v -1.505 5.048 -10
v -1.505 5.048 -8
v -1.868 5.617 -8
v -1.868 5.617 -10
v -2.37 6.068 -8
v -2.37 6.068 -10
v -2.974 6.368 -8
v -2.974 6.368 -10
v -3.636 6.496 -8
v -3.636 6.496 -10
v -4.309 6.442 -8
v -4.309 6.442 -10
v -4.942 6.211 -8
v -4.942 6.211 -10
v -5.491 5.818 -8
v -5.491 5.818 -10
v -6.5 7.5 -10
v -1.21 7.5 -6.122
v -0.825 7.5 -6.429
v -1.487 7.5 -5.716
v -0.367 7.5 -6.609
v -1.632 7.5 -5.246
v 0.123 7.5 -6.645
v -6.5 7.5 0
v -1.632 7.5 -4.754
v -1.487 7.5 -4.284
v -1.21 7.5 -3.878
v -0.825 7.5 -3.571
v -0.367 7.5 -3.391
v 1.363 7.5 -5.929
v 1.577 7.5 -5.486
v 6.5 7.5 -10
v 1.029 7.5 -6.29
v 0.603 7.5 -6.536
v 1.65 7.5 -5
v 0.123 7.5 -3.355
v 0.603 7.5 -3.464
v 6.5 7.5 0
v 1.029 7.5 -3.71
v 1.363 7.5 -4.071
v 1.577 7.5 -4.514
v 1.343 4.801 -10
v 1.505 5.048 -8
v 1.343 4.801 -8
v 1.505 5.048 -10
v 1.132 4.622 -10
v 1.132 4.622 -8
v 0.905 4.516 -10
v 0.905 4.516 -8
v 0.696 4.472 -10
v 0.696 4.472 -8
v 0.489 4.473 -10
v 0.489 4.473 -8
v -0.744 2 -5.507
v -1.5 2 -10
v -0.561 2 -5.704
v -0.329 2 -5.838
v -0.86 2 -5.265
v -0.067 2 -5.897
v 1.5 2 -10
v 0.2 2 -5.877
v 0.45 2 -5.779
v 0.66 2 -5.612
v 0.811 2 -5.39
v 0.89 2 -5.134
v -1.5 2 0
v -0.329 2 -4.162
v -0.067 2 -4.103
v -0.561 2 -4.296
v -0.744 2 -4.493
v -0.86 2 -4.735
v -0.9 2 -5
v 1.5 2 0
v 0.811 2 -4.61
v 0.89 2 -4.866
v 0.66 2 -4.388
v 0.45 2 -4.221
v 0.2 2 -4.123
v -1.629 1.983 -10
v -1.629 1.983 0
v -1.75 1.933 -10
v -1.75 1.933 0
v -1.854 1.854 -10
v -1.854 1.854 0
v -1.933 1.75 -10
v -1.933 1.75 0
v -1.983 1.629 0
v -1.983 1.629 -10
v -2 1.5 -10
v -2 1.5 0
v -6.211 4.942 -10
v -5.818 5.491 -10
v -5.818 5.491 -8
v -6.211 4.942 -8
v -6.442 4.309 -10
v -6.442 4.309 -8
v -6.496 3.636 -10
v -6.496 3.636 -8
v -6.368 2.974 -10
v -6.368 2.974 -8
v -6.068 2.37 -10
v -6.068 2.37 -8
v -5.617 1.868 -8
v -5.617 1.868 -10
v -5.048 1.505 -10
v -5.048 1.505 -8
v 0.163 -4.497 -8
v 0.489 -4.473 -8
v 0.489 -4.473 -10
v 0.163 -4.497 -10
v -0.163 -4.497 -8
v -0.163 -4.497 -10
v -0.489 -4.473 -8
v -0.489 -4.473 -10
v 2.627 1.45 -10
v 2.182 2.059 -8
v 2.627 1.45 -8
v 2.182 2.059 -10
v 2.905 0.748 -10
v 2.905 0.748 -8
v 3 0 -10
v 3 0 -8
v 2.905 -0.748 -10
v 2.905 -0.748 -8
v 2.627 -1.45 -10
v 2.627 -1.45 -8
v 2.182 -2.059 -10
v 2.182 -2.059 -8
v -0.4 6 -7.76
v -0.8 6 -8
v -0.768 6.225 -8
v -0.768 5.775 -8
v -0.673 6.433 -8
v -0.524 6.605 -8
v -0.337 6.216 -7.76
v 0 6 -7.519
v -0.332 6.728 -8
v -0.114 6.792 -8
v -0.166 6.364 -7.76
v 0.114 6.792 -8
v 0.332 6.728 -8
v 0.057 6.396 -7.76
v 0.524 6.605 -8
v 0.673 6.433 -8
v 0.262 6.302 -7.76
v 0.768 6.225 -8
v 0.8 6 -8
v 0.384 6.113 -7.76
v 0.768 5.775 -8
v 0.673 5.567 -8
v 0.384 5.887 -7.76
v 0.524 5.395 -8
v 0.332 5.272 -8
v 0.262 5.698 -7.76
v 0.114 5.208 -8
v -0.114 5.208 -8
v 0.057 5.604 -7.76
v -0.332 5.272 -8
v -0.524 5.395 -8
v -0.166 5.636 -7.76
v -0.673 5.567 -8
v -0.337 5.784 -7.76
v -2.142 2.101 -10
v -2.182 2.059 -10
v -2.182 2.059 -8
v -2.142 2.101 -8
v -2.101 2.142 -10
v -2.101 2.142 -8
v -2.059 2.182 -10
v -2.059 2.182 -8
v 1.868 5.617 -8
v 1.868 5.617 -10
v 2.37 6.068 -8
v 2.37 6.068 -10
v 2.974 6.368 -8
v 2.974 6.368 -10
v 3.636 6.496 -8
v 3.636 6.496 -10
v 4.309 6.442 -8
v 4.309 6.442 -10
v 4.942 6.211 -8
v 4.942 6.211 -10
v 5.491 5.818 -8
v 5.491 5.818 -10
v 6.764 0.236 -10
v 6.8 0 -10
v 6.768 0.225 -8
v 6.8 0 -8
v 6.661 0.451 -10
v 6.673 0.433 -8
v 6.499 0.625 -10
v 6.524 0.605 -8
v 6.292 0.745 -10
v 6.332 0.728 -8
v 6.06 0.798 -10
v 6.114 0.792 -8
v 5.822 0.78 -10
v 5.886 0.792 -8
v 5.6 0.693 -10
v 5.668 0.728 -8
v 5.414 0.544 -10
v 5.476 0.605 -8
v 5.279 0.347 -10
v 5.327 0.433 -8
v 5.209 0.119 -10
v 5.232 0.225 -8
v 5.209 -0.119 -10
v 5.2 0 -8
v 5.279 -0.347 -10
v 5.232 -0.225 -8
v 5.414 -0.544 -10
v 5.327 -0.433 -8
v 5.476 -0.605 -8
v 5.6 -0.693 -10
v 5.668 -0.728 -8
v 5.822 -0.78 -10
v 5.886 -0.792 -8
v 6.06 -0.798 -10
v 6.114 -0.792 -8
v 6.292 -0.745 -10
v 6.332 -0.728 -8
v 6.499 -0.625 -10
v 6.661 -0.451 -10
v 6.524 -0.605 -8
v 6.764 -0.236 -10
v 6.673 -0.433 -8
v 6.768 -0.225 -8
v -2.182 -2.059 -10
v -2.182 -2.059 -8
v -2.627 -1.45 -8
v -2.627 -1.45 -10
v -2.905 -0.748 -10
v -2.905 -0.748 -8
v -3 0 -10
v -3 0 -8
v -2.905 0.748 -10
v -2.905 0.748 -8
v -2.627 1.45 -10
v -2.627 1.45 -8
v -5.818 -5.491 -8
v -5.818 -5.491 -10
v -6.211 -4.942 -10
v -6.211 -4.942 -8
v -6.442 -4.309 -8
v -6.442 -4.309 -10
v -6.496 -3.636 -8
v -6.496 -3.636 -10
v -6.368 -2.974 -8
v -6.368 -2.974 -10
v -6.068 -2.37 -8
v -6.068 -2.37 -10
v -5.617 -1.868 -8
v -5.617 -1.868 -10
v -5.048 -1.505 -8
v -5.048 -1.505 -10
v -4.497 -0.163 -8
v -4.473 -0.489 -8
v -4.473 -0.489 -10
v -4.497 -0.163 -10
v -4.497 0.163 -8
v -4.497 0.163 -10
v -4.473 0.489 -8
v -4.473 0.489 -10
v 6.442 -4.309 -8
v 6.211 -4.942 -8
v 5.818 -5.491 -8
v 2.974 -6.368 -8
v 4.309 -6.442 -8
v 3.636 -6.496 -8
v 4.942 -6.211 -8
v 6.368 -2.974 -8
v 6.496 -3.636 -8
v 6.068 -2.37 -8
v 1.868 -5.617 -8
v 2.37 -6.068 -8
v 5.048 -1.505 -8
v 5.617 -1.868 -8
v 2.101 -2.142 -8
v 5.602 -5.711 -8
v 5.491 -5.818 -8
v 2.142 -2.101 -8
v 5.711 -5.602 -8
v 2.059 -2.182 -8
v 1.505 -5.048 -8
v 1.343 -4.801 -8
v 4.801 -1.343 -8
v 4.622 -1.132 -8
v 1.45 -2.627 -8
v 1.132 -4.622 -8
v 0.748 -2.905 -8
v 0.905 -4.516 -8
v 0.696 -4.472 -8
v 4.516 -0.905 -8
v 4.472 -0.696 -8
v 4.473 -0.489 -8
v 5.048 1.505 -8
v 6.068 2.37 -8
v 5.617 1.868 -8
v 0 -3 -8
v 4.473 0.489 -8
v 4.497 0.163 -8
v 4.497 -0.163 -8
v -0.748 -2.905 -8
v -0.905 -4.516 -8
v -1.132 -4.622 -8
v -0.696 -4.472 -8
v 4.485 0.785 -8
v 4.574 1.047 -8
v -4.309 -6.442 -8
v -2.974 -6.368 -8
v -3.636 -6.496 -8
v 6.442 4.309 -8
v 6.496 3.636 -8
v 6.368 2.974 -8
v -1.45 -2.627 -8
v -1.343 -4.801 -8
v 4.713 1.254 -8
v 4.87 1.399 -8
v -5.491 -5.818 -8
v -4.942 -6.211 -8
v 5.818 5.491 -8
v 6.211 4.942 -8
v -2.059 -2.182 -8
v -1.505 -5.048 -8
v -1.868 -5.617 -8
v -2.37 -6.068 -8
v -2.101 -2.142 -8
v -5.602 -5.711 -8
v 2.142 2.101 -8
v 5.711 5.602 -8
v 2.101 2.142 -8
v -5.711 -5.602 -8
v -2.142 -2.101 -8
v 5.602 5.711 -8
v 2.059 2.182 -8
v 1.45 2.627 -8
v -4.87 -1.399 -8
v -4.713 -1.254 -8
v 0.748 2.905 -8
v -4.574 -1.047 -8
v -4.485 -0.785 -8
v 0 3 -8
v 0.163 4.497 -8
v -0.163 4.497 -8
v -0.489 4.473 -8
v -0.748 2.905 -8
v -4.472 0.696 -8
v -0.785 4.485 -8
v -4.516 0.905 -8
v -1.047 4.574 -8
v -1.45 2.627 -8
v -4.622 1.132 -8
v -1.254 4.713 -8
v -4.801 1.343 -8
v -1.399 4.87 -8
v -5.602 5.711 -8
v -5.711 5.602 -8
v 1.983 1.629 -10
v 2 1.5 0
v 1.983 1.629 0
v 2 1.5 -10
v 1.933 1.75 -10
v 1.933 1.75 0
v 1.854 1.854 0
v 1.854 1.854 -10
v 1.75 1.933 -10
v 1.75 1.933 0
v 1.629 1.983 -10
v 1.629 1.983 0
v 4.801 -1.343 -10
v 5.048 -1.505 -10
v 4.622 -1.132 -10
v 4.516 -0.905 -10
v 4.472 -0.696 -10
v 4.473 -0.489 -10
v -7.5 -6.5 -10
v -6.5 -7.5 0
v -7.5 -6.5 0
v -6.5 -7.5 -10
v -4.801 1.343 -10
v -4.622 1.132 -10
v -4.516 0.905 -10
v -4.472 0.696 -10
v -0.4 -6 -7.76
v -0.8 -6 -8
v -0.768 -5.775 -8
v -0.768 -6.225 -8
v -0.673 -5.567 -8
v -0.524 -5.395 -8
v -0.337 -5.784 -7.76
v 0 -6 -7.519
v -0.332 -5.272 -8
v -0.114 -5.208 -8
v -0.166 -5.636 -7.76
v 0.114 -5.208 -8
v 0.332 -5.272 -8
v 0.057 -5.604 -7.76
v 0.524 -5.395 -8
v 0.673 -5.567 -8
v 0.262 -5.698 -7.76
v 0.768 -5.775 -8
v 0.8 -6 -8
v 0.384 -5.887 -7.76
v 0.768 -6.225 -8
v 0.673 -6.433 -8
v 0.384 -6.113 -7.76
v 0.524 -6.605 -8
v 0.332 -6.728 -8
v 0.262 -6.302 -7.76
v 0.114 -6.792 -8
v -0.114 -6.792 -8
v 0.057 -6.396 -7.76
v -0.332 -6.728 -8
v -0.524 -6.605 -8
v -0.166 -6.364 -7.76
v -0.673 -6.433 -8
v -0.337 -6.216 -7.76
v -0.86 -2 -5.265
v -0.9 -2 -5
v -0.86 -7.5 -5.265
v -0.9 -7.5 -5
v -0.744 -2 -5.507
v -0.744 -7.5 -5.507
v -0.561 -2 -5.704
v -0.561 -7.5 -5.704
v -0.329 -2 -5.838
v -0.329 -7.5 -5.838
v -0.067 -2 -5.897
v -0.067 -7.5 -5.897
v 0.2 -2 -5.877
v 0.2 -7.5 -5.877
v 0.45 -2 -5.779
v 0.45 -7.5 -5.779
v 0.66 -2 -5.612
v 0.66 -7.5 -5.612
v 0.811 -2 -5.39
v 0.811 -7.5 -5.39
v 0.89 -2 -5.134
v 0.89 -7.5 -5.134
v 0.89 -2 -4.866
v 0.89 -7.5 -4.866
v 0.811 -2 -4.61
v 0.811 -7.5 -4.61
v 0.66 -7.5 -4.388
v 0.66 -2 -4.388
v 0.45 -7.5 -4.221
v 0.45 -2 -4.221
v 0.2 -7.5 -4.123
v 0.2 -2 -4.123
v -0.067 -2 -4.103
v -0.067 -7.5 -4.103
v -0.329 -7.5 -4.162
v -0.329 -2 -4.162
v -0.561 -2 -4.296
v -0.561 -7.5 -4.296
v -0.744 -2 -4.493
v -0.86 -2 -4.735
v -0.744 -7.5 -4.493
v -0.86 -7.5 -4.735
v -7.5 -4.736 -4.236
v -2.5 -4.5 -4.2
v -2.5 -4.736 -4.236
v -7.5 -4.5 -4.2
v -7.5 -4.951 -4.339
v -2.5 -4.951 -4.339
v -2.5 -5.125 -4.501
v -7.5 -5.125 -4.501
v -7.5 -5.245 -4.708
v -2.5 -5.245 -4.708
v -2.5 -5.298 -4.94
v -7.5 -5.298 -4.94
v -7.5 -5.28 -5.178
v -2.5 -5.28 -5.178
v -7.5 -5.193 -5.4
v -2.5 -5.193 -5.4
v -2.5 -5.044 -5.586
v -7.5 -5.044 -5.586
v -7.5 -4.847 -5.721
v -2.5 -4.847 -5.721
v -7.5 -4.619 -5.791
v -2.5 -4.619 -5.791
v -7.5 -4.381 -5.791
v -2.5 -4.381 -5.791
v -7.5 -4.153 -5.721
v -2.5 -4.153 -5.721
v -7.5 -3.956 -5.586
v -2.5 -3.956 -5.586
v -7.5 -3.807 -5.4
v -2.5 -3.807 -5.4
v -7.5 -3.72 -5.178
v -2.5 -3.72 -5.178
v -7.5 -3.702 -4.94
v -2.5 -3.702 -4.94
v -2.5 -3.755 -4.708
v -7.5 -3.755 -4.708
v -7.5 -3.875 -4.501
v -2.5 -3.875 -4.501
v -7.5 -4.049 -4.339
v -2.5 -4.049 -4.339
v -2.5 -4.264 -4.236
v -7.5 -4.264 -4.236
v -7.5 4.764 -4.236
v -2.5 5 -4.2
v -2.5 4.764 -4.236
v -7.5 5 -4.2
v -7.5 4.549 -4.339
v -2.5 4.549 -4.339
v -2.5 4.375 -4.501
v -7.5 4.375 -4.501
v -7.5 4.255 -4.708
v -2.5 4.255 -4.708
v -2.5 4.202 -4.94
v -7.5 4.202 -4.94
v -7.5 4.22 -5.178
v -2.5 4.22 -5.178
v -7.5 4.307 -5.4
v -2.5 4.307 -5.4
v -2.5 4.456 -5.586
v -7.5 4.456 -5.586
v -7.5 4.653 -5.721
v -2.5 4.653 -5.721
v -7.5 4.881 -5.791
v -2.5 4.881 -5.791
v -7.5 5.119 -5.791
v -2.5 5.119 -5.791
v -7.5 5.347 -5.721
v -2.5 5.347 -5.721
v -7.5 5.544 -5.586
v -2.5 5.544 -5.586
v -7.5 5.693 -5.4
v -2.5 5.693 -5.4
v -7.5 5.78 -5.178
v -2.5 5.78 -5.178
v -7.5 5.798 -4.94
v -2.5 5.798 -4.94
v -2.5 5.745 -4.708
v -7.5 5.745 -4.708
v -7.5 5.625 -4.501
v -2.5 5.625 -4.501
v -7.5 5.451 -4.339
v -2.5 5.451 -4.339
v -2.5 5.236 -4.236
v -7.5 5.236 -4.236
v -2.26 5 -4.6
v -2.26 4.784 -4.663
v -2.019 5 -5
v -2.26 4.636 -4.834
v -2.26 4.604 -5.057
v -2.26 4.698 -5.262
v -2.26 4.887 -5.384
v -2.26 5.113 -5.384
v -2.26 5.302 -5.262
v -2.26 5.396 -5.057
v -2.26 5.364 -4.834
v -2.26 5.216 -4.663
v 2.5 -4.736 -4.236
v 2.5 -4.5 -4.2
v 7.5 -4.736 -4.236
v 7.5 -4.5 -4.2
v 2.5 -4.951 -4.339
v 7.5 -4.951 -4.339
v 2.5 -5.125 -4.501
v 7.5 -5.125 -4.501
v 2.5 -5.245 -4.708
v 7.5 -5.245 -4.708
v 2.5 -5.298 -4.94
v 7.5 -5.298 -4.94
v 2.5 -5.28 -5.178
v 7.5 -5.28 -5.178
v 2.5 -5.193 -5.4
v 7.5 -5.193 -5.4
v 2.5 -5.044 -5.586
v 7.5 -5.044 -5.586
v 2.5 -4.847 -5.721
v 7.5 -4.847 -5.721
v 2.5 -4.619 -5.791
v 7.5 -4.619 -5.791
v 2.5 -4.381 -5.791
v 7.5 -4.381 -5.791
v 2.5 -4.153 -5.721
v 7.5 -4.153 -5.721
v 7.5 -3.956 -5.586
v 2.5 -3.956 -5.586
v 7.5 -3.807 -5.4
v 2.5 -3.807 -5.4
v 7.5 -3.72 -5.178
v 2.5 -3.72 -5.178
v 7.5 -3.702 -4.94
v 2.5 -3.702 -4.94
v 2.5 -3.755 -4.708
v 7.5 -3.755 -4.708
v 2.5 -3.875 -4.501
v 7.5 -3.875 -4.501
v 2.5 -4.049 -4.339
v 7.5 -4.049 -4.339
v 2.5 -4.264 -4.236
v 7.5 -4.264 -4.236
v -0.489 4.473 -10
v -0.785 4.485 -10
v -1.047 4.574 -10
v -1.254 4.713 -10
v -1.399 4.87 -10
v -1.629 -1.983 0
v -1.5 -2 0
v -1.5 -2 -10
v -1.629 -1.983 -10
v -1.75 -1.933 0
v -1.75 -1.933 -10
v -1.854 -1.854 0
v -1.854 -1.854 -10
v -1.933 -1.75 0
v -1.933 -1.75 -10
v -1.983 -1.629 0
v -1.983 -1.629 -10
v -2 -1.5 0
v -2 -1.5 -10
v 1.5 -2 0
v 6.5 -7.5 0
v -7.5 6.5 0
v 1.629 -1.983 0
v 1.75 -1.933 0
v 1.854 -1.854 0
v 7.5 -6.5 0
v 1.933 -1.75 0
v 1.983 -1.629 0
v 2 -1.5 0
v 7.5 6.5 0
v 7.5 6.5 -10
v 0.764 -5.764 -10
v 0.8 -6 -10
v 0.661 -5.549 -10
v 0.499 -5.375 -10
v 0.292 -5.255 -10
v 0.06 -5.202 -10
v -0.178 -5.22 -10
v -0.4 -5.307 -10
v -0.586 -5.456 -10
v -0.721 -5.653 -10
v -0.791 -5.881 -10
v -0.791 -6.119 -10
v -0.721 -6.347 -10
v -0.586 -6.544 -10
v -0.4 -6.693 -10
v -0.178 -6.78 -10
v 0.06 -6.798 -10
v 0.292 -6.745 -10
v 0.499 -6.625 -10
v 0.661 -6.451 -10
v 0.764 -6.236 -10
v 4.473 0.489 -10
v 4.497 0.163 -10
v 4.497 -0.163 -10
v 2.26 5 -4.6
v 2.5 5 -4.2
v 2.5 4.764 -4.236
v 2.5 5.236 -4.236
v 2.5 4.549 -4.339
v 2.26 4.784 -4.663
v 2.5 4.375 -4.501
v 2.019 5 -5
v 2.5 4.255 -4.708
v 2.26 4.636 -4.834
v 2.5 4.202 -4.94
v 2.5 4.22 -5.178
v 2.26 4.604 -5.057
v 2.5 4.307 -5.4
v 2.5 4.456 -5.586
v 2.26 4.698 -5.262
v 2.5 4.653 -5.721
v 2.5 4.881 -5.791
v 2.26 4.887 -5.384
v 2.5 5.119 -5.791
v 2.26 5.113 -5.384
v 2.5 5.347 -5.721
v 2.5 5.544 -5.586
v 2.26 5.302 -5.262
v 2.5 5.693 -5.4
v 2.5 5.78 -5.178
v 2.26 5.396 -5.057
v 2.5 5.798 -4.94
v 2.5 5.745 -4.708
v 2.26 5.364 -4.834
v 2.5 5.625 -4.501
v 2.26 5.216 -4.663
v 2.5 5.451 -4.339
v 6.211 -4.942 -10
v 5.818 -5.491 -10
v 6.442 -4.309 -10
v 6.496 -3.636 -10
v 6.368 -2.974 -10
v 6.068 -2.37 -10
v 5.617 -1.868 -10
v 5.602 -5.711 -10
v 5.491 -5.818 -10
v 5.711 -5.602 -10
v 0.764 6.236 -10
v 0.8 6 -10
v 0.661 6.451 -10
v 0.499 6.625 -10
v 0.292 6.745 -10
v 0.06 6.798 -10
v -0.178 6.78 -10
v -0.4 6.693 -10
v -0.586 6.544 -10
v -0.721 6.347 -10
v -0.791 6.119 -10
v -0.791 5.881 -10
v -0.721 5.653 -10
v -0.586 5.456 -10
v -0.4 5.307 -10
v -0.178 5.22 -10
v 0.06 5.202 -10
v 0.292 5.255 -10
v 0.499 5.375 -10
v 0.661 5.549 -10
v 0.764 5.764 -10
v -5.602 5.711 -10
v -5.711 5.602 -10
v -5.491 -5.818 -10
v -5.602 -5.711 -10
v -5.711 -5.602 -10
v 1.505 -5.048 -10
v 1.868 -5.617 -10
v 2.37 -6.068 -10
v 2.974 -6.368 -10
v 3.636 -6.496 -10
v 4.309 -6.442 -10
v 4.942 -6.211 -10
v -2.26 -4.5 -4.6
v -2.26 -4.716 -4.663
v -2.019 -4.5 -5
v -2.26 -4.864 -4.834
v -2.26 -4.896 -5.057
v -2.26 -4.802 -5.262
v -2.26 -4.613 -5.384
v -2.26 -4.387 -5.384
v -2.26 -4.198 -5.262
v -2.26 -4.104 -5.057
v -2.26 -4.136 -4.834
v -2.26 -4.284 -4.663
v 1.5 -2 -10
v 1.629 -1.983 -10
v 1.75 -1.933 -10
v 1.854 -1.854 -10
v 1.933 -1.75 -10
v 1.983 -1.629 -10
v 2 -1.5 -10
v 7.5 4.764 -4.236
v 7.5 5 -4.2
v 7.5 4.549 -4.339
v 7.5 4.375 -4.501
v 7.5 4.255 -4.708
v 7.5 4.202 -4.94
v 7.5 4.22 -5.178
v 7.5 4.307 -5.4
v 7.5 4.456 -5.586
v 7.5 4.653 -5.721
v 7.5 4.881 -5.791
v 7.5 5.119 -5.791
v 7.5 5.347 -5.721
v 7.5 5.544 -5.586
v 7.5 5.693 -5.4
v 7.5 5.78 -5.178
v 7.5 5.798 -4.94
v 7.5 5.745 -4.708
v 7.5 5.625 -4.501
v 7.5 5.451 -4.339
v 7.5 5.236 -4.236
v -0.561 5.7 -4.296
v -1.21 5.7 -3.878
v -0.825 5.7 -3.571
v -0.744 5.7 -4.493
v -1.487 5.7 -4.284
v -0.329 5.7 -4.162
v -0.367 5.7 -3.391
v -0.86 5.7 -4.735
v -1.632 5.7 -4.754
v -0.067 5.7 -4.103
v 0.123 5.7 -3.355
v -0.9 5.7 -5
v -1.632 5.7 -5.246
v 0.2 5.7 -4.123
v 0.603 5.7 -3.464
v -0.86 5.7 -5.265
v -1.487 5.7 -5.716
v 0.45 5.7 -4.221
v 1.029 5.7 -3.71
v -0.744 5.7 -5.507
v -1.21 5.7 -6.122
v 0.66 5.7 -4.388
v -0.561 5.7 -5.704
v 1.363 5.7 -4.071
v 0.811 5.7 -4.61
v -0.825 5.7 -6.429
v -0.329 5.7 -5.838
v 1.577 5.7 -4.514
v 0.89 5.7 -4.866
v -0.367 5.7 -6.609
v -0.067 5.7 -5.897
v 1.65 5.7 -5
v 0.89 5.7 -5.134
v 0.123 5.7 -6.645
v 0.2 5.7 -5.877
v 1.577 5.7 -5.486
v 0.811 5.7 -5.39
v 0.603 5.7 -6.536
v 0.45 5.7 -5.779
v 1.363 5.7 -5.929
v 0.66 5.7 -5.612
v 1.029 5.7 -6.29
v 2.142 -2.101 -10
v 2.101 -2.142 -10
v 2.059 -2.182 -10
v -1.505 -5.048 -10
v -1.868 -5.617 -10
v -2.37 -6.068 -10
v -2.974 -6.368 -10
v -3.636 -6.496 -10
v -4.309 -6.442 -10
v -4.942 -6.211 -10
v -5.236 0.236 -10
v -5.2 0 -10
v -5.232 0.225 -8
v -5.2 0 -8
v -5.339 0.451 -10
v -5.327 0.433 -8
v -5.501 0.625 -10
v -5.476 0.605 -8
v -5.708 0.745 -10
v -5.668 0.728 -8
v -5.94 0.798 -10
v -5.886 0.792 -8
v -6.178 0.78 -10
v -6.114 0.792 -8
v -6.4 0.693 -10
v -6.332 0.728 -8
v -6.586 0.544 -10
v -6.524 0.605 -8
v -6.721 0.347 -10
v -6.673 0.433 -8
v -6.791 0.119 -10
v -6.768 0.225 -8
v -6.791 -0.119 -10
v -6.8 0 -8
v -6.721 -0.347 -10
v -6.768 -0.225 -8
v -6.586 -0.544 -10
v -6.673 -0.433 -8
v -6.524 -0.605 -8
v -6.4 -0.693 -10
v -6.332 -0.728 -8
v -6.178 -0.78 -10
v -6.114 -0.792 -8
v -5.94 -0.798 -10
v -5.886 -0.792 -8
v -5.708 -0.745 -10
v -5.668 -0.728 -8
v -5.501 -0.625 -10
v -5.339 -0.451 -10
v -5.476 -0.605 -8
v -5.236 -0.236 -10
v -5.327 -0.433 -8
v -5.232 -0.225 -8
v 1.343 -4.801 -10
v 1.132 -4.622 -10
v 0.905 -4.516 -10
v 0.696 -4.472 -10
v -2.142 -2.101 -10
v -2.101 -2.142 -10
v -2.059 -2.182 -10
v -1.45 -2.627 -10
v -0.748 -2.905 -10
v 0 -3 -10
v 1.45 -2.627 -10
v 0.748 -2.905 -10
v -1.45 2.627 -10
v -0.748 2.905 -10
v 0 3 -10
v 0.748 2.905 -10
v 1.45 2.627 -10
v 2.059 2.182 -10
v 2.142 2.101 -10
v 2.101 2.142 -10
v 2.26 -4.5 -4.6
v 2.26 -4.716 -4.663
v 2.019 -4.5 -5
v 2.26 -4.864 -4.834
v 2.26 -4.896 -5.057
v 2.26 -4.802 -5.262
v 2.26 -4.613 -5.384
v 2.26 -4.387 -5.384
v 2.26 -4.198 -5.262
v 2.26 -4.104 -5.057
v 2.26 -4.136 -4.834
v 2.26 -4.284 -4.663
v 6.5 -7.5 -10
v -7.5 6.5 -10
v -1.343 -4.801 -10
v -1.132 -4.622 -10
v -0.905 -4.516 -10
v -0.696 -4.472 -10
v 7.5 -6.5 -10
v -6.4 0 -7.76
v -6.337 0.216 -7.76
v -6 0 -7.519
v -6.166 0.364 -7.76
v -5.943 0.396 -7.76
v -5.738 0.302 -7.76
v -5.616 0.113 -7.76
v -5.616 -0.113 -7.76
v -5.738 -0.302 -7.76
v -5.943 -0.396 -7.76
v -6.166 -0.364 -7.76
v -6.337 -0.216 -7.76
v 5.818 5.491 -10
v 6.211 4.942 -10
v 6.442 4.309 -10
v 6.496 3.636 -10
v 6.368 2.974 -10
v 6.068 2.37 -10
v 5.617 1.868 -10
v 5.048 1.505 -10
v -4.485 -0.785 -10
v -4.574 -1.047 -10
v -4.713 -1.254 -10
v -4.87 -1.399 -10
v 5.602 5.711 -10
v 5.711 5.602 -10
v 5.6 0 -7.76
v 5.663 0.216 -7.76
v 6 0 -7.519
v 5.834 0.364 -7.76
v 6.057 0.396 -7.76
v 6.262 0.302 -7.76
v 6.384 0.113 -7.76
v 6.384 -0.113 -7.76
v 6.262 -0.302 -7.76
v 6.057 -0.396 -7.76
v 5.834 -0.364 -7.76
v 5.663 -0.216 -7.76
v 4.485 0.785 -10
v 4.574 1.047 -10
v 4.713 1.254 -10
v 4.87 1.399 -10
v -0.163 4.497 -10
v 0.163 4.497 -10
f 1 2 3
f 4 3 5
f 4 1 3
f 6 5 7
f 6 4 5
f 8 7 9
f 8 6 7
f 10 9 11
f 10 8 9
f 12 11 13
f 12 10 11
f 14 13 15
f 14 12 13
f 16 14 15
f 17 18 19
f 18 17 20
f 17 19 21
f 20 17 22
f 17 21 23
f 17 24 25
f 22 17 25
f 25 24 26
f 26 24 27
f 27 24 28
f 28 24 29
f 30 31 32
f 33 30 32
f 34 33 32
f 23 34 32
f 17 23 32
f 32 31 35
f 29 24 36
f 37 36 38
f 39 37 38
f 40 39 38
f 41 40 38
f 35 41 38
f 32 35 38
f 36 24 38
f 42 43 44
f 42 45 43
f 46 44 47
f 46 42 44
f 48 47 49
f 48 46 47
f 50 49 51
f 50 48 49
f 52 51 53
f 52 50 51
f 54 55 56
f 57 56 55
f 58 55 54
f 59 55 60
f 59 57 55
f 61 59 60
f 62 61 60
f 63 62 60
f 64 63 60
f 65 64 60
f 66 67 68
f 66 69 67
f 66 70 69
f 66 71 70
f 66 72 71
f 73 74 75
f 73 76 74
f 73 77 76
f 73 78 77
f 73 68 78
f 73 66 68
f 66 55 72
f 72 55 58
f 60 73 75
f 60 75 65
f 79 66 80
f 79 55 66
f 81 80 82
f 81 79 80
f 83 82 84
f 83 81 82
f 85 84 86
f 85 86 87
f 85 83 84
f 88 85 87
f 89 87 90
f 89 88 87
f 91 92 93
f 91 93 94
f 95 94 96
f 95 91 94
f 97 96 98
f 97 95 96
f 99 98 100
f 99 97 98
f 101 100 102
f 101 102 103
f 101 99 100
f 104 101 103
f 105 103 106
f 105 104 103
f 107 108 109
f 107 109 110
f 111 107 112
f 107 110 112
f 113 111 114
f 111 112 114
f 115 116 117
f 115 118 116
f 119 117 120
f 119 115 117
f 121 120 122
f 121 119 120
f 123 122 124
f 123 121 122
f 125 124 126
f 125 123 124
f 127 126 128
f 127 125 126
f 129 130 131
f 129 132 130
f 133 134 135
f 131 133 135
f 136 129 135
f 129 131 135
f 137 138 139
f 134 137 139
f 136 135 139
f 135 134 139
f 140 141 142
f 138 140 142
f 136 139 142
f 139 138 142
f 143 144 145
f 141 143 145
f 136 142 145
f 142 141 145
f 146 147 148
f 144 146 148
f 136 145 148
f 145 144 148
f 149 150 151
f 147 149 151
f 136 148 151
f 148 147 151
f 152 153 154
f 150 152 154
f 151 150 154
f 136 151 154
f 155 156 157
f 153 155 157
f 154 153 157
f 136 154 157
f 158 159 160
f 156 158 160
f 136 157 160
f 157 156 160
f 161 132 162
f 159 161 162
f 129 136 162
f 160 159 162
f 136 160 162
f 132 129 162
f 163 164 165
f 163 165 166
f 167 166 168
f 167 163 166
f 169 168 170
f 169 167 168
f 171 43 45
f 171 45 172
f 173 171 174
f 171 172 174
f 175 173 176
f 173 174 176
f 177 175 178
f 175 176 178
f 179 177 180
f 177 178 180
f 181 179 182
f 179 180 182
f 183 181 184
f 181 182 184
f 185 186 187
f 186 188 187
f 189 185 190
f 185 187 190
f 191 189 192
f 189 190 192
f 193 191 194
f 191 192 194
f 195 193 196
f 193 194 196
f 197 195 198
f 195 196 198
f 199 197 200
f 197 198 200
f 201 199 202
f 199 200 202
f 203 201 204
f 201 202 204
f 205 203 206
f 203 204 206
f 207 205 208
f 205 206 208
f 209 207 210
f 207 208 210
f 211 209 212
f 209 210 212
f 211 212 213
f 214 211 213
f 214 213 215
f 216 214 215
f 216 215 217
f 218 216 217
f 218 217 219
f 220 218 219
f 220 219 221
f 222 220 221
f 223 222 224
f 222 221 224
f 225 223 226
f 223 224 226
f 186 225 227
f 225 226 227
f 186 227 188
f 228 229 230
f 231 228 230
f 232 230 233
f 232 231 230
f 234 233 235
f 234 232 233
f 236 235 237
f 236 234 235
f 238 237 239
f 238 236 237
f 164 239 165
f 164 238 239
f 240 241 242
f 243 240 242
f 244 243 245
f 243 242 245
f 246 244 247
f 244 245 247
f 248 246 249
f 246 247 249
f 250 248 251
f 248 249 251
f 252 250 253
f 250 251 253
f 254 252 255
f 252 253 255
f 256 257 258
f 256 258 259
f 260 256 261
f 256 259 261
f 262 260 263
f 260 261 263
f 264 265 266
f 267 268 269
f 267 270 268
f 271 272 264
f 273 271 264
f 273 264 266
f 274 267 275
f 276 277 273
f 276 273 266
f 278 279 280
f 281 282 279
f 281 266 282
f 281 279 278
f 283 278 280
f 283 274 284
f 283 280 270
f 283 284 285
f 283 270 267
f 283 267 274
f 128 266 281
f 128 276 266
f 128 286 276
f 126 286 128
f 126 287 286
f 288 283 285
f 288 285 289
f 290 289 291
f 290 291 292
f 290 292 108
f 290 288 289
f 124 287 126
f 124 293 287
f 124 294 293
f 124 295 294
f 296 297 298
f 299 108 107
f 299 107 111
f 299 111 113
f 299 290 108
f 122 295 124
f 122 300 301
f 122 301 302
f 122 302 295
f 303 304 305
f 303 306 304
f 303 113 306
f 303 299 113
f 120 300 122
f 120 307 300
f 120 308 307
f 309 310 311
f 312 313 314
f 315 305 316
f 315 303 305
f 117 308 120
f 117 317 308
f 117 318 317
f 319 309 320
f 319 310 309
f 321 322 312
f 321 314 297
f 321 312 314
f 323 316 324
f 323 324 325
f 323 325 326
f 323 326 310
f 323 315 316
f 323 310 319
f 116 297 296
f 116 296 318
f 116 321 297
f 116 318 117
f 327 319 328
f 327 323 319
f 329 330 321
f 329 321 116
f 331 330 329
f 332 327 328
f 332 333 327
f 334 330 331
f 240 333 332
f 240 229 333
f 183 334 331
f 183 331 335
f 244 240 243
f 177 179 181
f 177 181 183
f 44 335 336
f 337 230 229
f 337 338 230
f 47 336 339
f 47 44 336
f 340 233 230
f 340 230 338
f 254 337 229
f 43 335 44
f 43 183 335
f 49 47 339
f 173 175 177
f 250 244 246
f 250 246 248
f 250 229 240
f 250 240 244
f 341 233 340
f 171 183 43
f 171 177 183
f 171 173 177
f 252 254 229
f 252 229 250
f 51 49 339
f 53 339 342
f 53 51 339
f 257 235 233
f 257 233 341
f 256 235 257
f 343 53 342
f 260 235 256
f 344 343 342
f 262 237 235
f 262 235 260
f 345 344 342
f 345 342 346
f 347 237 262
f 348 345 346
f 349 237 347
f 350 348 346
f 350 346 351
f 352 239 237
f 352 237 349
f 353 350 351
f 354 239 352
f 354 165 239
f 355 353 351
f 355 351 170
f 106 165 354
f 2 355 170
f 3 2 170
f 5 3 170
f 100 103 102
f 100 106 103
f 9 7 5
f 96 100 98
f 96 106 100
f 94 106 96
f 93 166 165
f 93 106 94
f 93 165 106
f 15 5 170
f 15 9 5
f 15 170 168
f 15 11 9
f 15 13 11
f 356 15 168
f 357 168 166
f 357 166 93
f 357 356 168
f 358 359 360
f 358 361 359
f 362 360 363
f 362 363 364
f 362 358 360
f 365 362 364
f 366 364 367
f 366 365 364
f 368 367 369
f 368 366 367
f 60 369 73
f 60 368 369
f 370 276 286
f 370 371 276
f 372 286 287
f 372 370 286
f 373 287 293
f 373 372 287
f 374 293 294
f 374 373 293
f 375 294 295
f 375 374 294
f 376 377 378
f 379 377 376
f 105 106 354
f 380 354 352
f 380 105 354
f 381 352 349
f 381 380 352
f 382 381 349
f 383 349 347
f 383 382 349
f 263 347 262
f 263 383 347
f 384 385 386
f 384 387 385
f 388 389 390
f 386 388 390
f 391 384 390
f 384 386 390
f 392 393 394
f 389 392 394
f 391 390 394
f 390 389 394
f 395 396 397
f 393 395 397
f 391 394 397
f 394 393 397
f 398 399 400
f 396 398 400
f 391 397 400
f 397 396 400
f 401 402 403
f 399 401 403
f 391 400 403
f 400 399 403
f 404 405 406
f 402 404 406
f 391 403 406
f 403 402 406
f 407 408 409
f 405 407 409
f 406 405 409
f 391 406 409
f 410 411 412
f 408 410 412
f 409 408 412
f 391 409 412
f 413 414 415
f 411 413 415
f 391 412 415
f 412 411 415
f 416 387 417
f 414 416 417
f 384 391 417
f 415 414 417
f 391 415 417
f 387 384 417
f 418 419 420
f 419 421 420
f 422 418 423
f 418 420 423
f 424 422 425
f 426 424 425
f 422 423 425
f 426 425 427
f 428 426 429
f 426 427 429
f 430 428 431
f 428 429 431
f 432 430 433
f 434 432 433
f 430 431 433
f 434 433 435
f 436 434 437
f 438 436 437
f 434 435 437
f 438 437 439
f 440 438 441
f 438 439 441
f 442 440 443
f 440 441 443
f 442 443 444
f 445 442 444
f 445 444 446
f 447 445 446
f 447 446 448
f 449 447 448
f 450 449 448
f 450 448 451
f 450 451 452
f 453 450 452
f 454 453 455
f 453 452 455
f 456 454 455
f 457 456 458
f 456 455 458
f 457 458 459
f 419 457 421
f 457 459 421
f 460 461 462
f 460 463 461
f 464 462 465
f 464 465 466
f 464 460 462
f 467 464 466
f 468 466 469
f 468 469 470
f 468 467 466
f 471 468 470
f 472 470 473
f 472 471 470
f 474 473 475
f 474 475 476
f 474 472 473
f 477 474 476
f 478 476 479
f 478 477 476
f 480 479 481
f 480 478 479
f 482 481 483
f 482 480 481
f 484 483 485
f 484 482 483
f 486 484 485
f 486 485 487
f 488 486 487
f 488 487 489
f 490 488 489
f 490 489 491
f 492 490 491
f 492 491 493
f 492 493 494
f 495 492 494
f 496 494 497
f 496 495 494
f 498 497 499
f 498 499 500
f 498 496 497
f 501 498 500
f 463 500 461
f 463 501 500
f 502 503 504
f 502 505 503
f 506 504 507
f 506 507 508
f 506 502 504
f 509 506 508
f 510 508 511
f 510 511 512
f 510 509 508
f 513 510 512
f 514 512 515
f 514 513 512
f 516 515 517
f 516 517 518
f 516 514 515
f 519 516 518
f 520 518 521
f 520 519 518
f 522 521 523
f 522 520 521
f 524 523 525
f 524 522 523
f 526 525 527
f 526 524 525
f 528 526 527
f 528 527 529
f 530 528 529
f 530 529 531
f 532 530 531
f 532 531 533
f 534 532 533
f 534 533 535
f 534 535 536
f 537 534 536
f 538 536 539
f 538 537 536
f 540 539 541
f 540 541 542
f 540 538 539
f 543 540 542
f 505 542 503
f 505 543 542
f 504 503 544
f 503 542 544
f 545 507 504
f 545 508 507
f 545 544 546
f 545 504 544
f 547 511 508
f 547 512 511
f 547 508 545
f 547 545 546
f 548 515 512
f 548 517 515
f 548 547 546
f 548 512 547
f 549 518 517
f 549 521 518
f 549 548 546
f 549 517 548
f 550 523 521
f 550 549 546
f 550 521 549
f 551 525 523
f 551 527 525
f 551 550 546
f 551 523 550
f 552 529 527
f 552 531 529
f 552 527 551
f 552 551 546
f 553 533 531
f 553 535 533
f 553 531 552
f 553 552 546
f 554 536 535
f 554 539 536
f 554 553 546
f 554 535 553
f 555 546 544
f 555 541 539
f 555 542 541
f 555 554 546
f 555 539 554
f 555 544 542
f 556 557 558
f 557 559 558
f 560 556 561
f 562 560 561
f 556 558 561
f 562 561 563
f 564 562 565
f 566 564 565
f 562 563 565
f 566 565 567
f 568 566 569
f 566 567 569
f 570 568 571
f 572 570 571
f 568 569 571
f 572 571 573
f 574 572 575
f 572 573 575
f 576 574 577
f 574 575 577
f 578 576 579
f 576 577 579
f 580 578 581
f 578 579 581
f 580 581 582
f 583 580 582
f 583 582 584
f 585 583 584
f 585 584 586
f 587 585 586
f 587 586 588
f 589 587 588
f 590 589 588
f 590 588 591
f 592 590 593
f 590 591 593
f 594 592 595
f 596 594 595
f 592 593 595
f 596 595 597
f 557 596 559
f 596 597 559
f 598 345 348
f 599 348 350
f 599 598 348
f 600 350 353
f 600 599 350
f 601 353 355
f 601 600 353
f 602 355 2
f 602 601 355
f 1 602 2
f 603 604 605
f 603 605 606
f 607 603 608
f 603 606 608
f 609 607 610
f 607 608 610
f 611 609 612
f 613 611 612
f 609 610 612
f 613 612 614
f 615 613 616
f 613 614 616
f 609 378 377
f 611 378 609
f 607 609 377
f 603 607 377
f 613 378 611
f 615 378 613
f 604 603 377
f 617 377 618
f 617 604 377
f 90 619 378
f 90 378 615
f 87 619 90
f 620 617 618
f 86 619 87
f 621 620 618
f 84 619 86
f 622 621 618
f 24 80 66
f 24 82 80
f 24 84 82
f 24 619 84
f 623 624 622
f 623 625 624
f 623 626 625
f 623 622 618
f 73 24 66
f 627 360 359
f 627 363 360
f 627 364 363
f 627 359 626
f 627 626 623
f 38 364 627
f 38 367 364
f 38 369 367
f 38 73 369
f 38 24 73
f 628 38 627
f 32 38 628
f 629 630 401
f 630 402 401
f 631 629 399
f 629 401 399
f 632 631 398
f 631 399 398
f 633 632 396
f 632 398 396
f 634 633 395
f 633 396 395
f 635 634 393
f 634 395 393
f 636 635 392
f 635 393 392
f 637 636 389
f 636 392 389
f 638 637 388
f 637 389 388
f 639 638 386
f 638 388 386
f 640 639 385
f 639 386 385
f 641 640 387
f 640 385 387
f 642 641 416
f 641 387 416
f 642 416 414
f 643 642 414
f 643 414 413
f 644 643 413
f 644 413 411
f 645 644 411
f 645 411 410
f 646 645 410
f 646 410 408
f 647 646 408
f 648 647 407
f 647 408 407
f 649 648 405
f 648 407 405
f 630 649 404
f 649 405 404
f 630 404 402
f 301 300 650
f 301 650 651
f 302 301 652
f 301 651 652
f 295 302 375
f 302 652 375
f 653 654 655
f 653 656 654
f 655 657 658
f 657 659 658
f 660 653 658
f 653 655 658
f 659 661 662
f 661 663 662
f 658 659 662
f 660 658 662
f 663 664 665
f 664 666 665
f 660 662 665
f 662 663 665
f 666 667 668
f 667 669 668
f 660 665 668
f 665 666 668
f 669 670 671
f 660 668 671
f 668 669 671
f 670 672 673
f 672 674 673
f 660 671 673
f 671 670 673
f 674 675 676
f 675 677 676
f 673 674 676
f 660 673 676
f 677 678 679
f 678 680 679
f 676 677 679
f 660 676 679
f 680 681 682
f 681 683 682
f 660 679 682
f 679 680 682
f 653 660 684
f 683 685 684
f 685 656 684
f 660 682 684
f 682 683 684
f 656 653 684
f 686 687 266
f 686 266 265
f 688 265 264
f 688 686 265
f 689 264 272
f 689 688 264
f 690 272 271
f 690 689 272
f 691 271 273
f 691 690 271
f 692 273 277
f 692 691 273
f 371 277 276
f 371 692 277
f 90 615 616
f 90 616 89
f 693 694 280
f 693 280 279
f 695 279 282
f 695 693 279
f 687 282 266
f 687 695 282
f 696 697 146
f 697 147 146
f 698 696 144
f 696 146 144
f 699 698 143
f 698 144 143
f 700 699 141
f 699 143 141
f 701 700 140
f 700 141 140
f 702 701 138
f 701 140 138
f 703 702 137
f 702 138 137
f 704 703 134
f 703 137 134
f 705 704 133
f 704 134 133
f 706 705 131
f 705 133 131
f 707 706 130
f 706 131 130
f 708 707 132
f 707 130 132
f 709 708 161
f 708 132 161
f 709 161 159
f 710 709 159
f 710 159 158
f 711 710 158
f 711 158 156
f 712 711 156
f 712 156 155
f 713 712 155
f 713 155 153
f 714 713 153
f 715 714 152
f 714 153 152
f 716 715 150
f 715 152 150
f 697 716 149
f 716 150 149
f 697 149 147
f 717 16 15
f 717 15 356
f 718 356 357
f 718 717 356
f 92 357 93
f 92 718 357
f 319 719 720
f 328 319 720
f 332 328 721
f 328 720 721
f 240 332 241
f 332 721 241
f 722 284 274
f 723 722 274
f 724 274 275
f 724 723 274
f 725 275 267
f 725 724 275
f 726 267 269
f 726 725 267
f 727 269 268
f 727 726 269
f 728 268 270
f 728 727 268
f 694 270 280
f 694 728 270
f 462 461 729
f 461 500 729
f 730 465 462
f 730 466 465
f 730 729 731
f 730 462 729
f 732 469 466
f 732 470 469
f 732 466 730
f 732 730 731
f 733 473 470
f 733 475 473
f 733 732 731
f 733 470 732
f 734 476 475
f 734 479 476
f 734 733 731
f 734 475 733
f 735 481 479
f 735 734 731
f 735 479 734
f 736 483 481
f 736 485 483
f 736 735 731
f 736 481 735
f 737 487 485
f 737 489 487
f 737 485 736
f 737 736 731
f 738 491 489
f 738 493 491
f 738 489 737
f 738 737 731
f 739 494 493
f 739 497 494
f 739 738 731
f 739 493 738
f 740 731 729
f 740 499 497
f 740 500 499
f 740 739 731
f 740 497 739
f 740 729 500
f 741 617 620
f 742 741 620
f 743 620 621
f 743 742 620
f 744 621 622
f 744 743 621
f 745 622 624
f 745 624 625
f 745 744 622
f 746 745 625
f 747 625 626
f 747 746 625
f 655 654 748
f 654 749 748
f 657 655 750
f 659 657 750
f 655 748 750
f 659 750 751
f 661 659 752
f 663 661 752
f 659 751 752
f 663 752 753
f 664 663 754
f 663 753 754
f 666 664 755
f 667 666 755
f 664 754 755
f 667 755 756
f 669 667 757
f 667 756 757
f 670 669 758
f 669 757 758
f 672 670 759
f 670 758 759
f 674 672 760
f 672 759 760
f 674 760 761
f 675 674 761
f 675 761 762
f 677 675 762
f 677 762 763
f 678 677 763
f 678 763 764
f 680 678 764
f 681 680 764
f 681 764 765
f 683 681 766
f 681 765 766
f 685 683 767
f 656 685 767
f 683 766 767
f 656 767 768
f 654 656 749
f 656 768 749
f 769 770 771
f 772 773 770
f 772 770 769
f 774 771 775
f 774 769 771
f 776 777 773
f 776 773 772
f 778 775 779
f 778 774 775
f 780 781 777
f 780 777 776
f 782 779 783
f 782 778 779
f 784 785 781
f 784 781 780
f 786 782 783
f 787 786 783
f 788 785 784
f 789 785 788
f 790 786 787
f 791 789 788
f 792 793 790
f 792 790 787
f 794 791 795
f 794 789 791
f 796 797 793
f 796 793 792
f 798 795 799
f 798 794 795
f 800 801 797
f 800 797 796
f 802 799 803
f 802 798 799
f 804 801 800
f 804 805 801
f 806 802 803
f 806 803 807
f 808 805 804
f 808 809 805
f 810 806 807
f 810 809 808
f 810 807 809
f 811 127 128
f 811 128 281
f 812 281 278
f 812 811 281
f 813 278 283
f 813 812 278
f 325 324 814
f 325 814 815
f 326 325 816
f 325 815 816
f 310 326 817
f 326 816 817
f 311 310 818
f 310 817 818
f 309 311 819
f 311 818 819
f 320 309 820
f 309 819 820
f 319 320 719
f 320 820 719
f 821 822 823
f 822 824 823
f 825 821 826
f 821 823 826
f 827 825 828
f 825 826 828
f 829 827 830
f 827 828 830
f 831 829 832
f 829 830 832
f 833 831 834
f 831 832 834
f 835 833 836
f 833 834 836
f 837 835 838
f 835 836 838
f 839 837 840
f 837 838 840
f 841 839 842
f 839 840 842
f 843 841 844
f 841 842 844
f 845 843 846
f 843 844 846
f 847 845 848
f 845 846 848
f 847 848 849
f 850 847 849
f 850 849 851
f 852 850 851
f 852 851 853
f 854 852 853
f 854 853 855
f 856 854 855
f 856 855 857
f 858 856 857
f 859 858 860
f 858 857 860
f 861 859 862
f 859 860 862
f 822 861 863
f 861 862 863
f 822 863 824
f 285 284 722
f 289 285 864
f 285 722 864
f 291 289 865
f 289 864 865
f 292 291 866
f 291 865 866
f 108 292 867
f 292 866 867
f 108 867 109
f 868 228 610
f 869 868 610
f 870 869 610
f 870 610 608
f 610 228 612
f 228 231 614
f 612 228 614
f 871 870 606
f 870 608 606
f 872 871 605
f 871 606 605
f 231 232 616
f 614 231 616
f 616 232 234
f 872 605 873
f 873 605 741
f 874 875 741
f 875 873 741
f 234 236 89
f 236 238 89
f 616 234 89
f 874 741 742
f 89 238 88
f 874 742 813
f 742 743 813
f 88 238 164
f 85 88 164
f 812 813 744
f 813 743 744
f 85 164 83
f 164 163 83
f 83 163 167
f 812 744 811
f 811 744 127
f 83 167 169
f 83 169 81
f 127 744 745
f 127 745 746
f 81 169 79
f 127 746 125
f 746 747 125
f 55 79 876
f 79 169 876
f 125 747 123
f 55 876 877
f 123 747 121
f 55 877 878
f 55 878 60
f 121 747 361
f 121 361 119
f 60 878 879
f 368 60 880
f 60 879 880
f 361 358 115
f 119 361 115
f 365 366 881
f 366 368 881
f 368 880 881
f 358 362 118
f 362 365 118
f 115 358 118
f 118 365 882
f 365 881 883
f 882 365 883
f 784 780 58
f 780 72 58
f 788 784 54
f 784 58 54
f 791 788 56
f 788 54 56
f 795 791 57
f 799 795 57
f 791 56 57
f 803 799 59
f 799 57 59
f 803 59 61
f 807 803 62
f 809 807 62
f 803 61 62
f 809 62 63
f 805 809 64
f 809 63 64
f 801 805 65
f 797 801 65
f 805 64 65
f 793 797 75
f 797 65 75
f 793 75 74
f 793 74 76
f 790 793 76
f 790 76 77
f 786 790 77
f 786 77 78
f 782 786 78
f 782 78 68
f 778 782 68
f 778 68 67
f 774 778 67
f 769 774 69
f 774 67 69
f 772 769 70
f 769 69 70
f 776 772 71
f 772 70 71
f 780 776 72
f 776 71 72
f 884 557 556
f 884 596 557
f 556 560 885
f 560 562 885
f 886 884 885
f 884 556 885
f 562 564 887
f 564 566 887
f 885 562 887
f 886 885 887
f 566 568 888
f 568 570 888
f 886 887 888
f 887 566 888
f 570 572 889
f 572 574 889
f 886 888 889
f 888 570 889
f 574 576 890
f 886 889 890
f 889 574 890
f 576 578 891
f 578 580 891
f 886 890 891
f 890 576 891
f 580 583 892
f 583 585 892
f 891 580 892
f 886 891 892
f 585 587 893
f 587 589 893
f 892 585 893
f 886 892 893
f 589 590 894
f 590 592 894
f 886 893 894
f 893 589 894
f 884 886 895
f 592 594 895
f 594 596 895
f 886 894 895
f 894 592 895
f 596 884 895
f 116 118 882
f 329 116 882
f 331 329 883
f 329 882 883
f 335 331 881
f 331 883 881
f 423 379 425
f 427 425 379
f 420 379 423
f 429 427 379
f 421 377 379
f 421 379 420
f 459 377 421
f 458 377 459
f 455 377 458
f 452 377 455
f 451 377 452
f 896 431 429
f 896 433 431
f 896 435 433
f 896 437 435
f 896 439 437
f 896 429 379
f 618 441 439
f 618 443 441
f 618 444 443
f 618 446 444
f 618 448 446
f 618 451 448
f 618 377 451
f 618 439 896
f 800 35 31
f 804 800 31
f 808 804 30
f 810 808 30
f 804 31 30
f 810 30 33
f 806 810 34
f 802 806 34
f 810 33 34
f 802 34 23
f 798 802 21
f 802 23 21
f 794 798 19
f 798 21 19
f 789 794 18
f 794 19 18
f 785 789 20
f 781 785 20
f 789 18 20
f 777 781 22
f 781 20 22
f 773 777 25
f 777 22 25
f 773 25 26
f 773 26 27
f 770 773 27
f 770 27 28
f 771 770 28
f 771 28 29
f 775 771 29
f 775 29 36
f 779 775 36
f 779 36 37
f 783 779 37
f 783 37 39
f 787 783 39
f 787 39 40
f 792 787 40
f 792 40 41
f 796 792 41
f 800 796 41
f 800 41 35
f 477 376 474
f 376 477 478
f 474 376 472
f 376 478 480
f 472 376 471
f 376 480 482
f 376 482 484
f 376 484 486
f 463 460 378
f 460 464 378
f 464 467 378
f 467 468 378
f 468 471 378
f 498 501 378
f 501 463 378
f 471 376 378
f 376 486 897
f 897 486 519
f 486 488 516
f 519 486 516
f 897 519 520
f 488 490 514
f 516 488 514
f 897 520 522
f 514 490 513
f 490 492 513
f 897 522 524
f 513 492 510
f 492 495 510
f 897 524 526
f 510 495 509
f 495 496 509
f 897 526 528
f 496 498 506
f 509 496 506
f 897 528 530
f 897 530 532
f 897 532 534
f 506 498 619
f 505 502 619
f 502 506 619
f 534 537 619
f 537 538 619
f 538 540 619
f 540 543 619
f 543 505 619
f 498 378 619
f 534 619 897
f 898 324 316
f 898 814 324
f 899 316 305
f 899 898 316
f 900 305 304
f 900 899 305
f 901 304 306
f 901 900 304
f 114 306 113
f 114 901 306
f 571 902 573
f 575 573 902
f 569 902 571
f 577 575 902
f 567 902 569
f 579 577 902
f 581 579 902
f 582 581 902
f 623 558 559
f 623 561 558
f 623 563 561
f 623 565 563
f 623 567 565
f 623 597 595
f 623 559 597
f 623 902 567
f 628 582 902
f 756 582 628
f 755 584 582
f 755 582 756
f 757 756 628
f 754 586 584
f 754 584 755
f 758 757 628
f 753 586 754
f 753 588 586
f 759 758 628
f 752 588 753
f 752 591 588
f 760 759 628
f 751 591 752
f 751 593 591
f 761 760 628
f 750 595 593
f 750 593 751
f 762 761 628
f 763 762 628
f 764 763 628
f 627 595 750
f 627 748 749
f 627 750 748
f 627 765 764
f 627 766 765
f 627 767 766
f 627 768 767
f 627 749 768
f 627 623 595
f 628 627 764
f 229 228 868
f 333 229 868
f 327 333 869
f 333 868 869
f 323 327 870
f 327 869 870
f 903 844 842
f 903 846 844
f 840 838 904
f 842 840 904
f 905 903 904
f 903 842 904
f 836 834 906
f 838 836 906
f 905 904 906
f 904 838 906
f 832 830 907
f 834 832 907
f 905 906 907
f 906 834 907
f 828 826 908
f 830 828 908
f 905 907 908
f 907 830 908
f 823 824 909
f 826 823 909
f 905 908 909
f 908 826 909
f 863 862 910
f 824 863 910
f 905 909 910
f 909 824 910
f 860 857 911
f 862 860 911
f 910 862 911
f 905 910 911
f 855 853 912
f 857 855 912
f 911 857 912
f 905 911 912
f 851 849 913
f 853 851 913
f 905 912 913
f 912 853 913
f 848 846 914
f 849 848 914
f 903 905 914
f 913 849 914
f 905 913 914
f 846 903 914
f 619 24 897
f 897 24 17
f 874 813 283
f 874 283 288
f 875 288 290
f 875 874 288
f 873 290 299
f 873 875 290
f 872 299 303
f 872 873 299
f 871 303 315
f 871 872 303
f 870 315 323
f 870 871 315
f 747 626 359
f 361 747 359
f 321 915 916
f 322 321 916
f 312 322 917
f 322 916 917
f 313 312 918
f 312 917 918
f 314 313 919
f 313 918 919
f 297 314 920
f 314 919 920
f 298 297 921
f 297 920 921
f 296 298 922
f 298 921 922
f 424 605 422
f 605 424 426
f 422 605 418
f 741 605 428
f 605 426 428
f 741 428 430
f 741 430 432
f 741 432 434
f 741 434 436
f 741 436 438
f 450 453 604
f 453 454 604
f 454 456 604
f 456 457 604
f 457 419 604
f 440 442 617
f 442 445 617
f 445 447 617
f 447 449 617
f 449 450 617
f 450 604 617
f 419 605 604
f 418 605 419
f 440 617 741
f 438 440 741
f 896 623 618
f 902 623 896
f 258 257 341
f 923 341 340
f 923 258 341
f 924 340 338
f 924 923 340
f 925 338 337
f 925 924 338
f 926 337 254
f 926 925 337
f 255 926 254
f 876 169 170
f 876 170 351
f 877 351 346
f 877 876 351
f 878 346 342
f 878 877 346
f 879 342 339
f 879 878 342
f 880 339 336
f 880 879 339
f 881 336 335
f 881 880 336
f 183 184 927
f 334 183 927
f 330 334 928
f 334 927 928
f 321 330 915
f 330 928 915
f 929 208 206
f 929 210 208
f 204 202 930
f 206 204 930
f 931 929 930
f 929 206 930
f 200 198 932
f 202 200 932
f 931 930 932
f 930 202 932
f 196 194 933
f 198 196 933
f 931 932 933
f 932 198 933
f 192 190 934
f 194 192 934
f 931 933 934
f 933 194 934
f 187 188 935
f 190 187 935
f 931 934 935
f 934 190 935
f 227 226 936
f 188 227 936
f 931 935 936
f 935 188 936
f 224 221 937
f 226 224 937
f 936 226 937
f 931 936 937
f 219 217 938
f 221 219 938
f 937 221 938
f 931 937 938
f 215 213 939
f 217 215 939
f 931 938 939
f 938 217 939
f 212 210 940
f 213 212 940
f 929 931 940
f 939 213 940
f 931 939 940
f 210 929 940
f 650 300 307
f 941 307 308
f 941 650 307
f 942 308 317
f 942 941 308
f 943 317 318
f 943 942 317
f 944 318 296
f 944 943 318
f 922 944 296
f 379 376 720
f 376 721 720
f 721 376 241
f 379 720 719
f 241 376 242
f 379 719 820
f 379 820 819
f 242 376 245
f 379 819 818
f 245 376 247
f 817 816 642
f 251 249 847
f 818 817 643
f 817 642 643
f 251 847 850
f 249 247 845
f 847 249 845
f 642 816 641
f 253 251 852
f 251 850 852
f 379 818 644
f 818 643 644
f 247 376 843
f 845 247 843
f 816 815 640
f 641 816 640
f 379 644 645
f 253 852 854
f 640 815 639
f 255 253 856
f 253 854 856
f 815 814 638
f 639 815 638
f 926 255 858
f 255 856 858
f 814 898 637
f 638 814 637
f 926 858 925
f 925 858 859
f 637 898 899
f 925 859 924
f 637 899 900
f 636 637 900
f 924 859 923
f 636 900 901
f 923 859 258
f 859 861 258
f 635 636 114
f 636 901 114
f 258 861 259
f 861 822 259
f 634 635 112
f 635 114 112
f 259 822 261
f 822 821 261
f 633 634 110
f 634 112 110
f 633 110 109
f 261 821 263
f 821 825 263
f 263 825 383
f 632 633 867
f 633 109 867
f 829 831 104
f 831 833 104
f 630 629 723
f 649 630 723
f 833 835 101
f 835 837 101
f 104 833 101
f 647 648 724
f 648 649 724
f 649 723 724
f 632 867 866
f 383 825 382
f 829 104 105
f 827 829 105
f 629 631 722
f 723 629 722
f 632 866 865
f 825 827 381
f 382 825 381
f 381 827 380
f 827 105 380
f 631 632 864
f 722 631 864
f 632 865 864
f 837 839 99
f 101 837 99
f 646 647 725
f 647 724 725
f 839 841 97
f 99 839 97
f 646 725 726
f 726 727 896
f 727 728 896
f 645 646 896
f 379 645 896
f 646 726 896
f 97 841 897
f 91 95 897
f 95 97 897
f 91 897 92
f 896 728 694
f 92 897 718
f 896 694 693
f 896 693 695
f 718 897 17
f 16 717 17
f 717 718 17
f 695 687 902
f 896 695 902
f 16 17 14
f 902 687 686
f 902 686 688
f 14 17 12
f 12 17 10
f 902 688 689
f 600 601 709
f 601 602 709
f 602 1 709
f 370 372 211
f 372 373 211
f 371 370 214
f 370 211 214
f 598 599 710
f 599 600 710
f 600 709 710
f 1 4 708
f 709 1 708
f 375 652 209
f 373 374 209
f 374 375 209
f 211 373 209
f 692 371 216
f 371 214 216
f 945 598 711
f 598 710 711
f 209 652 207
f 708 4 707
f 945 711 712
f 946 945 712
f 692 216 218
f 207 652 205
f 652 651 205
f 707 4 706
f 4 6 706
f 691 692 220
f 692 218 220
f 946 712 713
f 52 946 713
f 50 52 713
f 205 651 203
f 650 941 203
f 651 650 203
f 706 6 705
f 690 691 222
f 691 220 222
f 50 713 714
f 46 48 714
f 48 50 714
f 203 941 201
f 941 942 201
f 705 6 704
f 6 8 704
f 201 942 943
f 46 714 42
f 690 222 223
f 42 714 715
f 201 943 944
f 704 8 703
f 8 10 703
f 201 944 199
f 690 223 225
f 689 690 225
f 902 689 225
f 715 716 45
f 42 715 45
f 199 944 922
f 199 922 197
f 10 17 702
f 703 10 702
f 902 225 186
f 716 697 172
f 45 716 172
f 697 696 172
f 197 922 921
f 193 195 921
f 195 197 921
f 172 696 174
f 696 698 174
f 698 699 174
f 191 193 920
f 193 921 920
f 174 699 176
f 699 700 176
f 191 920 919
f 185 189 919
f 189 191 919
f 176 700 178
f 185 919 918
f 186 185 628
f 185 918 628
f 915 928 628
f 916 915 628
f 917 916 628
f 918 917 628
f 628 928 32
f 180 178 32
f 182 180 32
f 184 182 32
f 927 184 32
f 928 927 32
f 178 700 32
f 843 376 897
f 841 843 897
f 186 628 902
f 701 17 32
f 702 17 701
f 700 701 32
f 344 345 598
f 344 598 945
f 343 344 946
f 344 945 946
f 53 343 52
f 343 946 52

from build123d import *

# Parameters (mm, degrees)
SKETCH1_W                                            = 15
SKETCH1_H                                            = 15
SKETCH1_W_2                                          = 4
SKETCH1_H_2                                          = 4
BOSS_EXTRUDE1_DEPTH                                  = 10
FILLET1_R                                            = 0.5
CBORE_FOR_M1_6_HEXAGON_SOCKET_HEAD_CAP_S_D           = 1.8
CBORE_FOR_M1_6_HEXAGON_SOCKET_HEAD_CAP_S_CBORE_D     = 3.3
CBORE_FOR_M1_6_HEXAGON_SOCKET_HEAD_CAP_S_CBORE_DEPTH = 1.8
M2_TAPPED_HOLE1_AT_2_COUNT                           = 2
M2_TAPPED_HOLE1_AT_2_PITCH                           = 9.5
CHAMFER1_SIZE                                        = 1
CUT_EXTRUDE1_DEPTH                                   = 2
M2_TAPPED_HOLE2_D                                    = 1.6
M2_TAPPED_HOLE2_DEPTH                                = 2
M2_TAPPED_HOLE2_TIP                                  = 0.480688495
SKETCH12_R                                           = 4.5
SKETCH12_R_2                                         = 3
CUT_EXTRUDE2_DEPTH                                   = 2
FILLET2_R                                            = 1
CHAMFER2_SIZE                                        = 1


with BuildPart() as part:
    # Sketch1 → Boss-Extrude1 (new body)
    with BuildSketch(Plane.XY):
        Rectangle(SKETCH1_W, SKETCH1_H)
        Rectangle(SKETCH1_W_2, SKETCH1_H_2, mode=Mode.SUBTRACT)
    extrude(amount=-BOSS_EXTRUDE1_DEPTH)

    # Fillet1
    fillet1_edges = [part.edges().sort_by_distance(p)[0] for p in [
        (2, 2, -5),
        (2, -2, -5),
        (-2, -2, -5),
        (-2, 2, -5),
    ]]
    fillet(fillet1_edges, radius=FILLET1_R)

    # CBORE for M1.6 Hexagon socket head cap screws1 (through all)
    with Locations(Plane(origin=(0, 7.5, 0), x_dir=(1, 0, 0), z_dir=(0, 1, 0))):
        with Locations((0, 5)):
            CounterBoreHole(CBORE_FOR_M1_6_HEXAGON_SOCKET_HEAD_CAP_S_D / 2, CBORE_FOR_M1_6_HEXAGON_SOCKET_HEAD_CAP_S_CBORE_D / 2, CBORE_FOR_M1_6_HEXAGON_SOCKET_HEAD_CAP_S_CBORE_DEPTH)

    # Sketch6 → M2 Tapped Hole1 (revolve, cut)
    with BuildSketch(Plane(origin=(-7.5, 5, -5), x_dir=(0, 0, 1), z_dir=(0, 1, 0))):
        Polygon((0, 0), (0, 5.480688495), (0.8, 5), (0.8, 0), align=None)
    m2_tapped_hole1 = revolve(axis=Axis((-13.85, 5, -5), (1, 0, 0)), mode=Mode.SUBTRACT)

    # M2 Tapped Hole1 at 2: M2 Tapped Hole1 ×2
    with Locations(*[(0, -i * M2_TAPPED_HOLE1_AT_2_PITCH, 0) for i in range(1, M2_TAPPED_HOLE1_AT_2_COUNT)]):
        add(m2_tapped_hole1, mode=Mode.SUBTRACT)

    # Mirror1: M2 Tapped Hole1 across plane
    add(m2_tapped_hole1.mirror(Plane(origin=(0, 0, 0), x_dir=(0, 0, 1), z_dir=(1, 0, 0))), mode=Mode.SUBTRACT)

    # Mirror1 copy 1 sketch → Mirror1 copy 1 (revolve, cut)
    with BuildSketch(Plane(origin=(7.5, -4.5, -5), x_dir=(0, 0, 1), z_dir=(0, 1, 0))):
        Polygon((0, 0), (0, -5.480688495), (0.8, -5), (0.8, 0), align=None)
    revolve(axis=Axis((13.85, -4.5, -5), (1, 0, 0)), mode=Mode.SUBTRACT)

    # Chamfer1
    chamfer1_edges = [part.edges().sort_by_distance(p)[0] for p in [
        (7.5, -7.5, -5),
        (-7.5, -7.5, -5),
    ]]
    chamfer(chamfer1_edges, length=CHAMFER1_SIZE)

    # Sketch8 → Cut-Extrude1 (cut)
    with BuildSketch(Plane(origin=(0, 0, -10), x_dir=(-1, 0, 0), z_dir=(0, 0, -1))):
        with BuildLine():
            ThreePointArc((-5.49078868, 5.818181818), (-5.656854249, 5.656854249), (-5.818181818, 5.49078868))
            ThreePointArc((-5.818181818, 5.49078868), (-5.715871463, 1.956735399), (-2.181818182, 2.059045755))
            ThreePointArc((-2.181818182, 2.059045755), (-2.121320344, 2.121320344), (-2.059045755, 2.181818182))
            ThreePointArc((-2.059045755, 2.181818182), (-1.956735399, 5.715871463), (-5.49078868, 5.818181818))
        make_face()
        with BuildLine():
            ThreePointArc((-5.49078868, -5.818181818), (-5.656854249, -5.656854249), (-5.818181818, -5.49078868))
            ThreePointArc((-5.818181818, -5.49078868), (-5.715871463, -1.956735399), (-2.181818182, -2.059045755))
            ThreePointArc((-2.181818182, -2.059045755), (-2.121320344, -2.121320344), (-2.059045755, -2.181818182))
            ThreePointArc((-2.059045755, -2.181818182), (-1.956735399, -5.715871463), (-5.49078868, -5.818181818))
        make_face()
        with BuildLine():
            ThreePointArc((5.49078868, 5.818181818), (5.656854249, 5.656854249), (5.818181818, 5.49078868))
            ThreePointArc((5.818181818, 5.49078868), (5.715871463, 1.956735399), (2.181818182, 2.059045755))
            ThreePointArc((2.181818182, 2.059045755), (2.121320344, 2.121320344), (2.059045755, 2.181818182))
            ThreePointArc((2.059045755, 2.181818182), (1.956735399, 5.715871463), (5.49078868, 5.818181818))
        make_face()
        with BuildLine():
            ThreePointArc((5.49078868, -5.818181818), (5.656854249, -5.656854249), (5.818181818, -5.49078868))
            ThreePointArc((5.818181818, -5.49078868), (5.715871463, -1.956735399), (2.181818182, -2.059045755))
            ThreePointArc((2.181818182, -2.059045755), (2.121320344, -2.121320344), (2.059045755, -2.181818182))
            ThreePointArc((2.059045755, -2.181818182), (1.956735399, -5.715871463), (5.49078868, -5.818181818))
        make_face()
    extrude(amount=-CUT_EXTRUDE1_DEPTH, mode=Mode.SUBTRACT)

    # M2 Tapped Hole2
    with Locations(Plane(origin=(0, 0, -10), x_dir=(-1, 0, 0), z_dir=(0, 0, -1))):
        with Locations((-6, 0), (0, 6), (6, 0), (0, -6)):
            Hole(M2_TAPPED_HOLE2_D / 2, depth=M2_TAPPED_HOLE2_DEPTH)
            with Locations((0, 0, -(M2_TAPPED_HOLE2_DEPTH + M2_TAPPED_HOLE2_TIP / 2))):  # 118° drill point
                Cone(0, M2_TAPPED_HOLE2_D / 2, M2_TAPPED_HOLE2_TIP, mode=Mode.SUBTRACT)

    # Sketch12 → Cut-Extrude2 (cut)
    with BuildSketch(Plane(origin=(0, 0, -10), x_dir=(-1, 0, 0), z_dir=(0, 0, -1))):
        Circle(SKETCH12_R)
        with Locations(Location((0, 0, 0), (0, 0, 180))):
            Circle(SKETCH12_R_2, mode=Mode.SUBTRACT)
    extrude(amount=-CUT_EXTRUDE2_DEPTH, mode=Mode.SUBTRACT)

    # Fillet2
    fillet2_edges = [part.edges().sort_by_distance(p)[0] for p in [
        (1.294196531, 4.309878808, -9),
        (-1.294196531, 4.309878808, -9),
        (4.309878808, 1.294196531, -9),
        (4.309878808, -1.294196531, -9),
        (-1.294196531, -4.309878808, -9),
        (1.294196531, -4.309878808, -9),
        (-4.309878808, -1.294196531, -9),
        (-4.309878808, 1.294196531, -9),
    ]]
    fillet(fillet2_edges, radius=FILLET2_R)

    # Chamfer2
    chamfer2_edges = [part.edges().sort_by_distance(p)[0] for p in [
        (-7.5, 7.5, -5),
        (7.5, 7.5, -5),
    ]]
    chamfer(chamfer2_edges, length=CHAMFER2_SIZE)


solid = part.part
